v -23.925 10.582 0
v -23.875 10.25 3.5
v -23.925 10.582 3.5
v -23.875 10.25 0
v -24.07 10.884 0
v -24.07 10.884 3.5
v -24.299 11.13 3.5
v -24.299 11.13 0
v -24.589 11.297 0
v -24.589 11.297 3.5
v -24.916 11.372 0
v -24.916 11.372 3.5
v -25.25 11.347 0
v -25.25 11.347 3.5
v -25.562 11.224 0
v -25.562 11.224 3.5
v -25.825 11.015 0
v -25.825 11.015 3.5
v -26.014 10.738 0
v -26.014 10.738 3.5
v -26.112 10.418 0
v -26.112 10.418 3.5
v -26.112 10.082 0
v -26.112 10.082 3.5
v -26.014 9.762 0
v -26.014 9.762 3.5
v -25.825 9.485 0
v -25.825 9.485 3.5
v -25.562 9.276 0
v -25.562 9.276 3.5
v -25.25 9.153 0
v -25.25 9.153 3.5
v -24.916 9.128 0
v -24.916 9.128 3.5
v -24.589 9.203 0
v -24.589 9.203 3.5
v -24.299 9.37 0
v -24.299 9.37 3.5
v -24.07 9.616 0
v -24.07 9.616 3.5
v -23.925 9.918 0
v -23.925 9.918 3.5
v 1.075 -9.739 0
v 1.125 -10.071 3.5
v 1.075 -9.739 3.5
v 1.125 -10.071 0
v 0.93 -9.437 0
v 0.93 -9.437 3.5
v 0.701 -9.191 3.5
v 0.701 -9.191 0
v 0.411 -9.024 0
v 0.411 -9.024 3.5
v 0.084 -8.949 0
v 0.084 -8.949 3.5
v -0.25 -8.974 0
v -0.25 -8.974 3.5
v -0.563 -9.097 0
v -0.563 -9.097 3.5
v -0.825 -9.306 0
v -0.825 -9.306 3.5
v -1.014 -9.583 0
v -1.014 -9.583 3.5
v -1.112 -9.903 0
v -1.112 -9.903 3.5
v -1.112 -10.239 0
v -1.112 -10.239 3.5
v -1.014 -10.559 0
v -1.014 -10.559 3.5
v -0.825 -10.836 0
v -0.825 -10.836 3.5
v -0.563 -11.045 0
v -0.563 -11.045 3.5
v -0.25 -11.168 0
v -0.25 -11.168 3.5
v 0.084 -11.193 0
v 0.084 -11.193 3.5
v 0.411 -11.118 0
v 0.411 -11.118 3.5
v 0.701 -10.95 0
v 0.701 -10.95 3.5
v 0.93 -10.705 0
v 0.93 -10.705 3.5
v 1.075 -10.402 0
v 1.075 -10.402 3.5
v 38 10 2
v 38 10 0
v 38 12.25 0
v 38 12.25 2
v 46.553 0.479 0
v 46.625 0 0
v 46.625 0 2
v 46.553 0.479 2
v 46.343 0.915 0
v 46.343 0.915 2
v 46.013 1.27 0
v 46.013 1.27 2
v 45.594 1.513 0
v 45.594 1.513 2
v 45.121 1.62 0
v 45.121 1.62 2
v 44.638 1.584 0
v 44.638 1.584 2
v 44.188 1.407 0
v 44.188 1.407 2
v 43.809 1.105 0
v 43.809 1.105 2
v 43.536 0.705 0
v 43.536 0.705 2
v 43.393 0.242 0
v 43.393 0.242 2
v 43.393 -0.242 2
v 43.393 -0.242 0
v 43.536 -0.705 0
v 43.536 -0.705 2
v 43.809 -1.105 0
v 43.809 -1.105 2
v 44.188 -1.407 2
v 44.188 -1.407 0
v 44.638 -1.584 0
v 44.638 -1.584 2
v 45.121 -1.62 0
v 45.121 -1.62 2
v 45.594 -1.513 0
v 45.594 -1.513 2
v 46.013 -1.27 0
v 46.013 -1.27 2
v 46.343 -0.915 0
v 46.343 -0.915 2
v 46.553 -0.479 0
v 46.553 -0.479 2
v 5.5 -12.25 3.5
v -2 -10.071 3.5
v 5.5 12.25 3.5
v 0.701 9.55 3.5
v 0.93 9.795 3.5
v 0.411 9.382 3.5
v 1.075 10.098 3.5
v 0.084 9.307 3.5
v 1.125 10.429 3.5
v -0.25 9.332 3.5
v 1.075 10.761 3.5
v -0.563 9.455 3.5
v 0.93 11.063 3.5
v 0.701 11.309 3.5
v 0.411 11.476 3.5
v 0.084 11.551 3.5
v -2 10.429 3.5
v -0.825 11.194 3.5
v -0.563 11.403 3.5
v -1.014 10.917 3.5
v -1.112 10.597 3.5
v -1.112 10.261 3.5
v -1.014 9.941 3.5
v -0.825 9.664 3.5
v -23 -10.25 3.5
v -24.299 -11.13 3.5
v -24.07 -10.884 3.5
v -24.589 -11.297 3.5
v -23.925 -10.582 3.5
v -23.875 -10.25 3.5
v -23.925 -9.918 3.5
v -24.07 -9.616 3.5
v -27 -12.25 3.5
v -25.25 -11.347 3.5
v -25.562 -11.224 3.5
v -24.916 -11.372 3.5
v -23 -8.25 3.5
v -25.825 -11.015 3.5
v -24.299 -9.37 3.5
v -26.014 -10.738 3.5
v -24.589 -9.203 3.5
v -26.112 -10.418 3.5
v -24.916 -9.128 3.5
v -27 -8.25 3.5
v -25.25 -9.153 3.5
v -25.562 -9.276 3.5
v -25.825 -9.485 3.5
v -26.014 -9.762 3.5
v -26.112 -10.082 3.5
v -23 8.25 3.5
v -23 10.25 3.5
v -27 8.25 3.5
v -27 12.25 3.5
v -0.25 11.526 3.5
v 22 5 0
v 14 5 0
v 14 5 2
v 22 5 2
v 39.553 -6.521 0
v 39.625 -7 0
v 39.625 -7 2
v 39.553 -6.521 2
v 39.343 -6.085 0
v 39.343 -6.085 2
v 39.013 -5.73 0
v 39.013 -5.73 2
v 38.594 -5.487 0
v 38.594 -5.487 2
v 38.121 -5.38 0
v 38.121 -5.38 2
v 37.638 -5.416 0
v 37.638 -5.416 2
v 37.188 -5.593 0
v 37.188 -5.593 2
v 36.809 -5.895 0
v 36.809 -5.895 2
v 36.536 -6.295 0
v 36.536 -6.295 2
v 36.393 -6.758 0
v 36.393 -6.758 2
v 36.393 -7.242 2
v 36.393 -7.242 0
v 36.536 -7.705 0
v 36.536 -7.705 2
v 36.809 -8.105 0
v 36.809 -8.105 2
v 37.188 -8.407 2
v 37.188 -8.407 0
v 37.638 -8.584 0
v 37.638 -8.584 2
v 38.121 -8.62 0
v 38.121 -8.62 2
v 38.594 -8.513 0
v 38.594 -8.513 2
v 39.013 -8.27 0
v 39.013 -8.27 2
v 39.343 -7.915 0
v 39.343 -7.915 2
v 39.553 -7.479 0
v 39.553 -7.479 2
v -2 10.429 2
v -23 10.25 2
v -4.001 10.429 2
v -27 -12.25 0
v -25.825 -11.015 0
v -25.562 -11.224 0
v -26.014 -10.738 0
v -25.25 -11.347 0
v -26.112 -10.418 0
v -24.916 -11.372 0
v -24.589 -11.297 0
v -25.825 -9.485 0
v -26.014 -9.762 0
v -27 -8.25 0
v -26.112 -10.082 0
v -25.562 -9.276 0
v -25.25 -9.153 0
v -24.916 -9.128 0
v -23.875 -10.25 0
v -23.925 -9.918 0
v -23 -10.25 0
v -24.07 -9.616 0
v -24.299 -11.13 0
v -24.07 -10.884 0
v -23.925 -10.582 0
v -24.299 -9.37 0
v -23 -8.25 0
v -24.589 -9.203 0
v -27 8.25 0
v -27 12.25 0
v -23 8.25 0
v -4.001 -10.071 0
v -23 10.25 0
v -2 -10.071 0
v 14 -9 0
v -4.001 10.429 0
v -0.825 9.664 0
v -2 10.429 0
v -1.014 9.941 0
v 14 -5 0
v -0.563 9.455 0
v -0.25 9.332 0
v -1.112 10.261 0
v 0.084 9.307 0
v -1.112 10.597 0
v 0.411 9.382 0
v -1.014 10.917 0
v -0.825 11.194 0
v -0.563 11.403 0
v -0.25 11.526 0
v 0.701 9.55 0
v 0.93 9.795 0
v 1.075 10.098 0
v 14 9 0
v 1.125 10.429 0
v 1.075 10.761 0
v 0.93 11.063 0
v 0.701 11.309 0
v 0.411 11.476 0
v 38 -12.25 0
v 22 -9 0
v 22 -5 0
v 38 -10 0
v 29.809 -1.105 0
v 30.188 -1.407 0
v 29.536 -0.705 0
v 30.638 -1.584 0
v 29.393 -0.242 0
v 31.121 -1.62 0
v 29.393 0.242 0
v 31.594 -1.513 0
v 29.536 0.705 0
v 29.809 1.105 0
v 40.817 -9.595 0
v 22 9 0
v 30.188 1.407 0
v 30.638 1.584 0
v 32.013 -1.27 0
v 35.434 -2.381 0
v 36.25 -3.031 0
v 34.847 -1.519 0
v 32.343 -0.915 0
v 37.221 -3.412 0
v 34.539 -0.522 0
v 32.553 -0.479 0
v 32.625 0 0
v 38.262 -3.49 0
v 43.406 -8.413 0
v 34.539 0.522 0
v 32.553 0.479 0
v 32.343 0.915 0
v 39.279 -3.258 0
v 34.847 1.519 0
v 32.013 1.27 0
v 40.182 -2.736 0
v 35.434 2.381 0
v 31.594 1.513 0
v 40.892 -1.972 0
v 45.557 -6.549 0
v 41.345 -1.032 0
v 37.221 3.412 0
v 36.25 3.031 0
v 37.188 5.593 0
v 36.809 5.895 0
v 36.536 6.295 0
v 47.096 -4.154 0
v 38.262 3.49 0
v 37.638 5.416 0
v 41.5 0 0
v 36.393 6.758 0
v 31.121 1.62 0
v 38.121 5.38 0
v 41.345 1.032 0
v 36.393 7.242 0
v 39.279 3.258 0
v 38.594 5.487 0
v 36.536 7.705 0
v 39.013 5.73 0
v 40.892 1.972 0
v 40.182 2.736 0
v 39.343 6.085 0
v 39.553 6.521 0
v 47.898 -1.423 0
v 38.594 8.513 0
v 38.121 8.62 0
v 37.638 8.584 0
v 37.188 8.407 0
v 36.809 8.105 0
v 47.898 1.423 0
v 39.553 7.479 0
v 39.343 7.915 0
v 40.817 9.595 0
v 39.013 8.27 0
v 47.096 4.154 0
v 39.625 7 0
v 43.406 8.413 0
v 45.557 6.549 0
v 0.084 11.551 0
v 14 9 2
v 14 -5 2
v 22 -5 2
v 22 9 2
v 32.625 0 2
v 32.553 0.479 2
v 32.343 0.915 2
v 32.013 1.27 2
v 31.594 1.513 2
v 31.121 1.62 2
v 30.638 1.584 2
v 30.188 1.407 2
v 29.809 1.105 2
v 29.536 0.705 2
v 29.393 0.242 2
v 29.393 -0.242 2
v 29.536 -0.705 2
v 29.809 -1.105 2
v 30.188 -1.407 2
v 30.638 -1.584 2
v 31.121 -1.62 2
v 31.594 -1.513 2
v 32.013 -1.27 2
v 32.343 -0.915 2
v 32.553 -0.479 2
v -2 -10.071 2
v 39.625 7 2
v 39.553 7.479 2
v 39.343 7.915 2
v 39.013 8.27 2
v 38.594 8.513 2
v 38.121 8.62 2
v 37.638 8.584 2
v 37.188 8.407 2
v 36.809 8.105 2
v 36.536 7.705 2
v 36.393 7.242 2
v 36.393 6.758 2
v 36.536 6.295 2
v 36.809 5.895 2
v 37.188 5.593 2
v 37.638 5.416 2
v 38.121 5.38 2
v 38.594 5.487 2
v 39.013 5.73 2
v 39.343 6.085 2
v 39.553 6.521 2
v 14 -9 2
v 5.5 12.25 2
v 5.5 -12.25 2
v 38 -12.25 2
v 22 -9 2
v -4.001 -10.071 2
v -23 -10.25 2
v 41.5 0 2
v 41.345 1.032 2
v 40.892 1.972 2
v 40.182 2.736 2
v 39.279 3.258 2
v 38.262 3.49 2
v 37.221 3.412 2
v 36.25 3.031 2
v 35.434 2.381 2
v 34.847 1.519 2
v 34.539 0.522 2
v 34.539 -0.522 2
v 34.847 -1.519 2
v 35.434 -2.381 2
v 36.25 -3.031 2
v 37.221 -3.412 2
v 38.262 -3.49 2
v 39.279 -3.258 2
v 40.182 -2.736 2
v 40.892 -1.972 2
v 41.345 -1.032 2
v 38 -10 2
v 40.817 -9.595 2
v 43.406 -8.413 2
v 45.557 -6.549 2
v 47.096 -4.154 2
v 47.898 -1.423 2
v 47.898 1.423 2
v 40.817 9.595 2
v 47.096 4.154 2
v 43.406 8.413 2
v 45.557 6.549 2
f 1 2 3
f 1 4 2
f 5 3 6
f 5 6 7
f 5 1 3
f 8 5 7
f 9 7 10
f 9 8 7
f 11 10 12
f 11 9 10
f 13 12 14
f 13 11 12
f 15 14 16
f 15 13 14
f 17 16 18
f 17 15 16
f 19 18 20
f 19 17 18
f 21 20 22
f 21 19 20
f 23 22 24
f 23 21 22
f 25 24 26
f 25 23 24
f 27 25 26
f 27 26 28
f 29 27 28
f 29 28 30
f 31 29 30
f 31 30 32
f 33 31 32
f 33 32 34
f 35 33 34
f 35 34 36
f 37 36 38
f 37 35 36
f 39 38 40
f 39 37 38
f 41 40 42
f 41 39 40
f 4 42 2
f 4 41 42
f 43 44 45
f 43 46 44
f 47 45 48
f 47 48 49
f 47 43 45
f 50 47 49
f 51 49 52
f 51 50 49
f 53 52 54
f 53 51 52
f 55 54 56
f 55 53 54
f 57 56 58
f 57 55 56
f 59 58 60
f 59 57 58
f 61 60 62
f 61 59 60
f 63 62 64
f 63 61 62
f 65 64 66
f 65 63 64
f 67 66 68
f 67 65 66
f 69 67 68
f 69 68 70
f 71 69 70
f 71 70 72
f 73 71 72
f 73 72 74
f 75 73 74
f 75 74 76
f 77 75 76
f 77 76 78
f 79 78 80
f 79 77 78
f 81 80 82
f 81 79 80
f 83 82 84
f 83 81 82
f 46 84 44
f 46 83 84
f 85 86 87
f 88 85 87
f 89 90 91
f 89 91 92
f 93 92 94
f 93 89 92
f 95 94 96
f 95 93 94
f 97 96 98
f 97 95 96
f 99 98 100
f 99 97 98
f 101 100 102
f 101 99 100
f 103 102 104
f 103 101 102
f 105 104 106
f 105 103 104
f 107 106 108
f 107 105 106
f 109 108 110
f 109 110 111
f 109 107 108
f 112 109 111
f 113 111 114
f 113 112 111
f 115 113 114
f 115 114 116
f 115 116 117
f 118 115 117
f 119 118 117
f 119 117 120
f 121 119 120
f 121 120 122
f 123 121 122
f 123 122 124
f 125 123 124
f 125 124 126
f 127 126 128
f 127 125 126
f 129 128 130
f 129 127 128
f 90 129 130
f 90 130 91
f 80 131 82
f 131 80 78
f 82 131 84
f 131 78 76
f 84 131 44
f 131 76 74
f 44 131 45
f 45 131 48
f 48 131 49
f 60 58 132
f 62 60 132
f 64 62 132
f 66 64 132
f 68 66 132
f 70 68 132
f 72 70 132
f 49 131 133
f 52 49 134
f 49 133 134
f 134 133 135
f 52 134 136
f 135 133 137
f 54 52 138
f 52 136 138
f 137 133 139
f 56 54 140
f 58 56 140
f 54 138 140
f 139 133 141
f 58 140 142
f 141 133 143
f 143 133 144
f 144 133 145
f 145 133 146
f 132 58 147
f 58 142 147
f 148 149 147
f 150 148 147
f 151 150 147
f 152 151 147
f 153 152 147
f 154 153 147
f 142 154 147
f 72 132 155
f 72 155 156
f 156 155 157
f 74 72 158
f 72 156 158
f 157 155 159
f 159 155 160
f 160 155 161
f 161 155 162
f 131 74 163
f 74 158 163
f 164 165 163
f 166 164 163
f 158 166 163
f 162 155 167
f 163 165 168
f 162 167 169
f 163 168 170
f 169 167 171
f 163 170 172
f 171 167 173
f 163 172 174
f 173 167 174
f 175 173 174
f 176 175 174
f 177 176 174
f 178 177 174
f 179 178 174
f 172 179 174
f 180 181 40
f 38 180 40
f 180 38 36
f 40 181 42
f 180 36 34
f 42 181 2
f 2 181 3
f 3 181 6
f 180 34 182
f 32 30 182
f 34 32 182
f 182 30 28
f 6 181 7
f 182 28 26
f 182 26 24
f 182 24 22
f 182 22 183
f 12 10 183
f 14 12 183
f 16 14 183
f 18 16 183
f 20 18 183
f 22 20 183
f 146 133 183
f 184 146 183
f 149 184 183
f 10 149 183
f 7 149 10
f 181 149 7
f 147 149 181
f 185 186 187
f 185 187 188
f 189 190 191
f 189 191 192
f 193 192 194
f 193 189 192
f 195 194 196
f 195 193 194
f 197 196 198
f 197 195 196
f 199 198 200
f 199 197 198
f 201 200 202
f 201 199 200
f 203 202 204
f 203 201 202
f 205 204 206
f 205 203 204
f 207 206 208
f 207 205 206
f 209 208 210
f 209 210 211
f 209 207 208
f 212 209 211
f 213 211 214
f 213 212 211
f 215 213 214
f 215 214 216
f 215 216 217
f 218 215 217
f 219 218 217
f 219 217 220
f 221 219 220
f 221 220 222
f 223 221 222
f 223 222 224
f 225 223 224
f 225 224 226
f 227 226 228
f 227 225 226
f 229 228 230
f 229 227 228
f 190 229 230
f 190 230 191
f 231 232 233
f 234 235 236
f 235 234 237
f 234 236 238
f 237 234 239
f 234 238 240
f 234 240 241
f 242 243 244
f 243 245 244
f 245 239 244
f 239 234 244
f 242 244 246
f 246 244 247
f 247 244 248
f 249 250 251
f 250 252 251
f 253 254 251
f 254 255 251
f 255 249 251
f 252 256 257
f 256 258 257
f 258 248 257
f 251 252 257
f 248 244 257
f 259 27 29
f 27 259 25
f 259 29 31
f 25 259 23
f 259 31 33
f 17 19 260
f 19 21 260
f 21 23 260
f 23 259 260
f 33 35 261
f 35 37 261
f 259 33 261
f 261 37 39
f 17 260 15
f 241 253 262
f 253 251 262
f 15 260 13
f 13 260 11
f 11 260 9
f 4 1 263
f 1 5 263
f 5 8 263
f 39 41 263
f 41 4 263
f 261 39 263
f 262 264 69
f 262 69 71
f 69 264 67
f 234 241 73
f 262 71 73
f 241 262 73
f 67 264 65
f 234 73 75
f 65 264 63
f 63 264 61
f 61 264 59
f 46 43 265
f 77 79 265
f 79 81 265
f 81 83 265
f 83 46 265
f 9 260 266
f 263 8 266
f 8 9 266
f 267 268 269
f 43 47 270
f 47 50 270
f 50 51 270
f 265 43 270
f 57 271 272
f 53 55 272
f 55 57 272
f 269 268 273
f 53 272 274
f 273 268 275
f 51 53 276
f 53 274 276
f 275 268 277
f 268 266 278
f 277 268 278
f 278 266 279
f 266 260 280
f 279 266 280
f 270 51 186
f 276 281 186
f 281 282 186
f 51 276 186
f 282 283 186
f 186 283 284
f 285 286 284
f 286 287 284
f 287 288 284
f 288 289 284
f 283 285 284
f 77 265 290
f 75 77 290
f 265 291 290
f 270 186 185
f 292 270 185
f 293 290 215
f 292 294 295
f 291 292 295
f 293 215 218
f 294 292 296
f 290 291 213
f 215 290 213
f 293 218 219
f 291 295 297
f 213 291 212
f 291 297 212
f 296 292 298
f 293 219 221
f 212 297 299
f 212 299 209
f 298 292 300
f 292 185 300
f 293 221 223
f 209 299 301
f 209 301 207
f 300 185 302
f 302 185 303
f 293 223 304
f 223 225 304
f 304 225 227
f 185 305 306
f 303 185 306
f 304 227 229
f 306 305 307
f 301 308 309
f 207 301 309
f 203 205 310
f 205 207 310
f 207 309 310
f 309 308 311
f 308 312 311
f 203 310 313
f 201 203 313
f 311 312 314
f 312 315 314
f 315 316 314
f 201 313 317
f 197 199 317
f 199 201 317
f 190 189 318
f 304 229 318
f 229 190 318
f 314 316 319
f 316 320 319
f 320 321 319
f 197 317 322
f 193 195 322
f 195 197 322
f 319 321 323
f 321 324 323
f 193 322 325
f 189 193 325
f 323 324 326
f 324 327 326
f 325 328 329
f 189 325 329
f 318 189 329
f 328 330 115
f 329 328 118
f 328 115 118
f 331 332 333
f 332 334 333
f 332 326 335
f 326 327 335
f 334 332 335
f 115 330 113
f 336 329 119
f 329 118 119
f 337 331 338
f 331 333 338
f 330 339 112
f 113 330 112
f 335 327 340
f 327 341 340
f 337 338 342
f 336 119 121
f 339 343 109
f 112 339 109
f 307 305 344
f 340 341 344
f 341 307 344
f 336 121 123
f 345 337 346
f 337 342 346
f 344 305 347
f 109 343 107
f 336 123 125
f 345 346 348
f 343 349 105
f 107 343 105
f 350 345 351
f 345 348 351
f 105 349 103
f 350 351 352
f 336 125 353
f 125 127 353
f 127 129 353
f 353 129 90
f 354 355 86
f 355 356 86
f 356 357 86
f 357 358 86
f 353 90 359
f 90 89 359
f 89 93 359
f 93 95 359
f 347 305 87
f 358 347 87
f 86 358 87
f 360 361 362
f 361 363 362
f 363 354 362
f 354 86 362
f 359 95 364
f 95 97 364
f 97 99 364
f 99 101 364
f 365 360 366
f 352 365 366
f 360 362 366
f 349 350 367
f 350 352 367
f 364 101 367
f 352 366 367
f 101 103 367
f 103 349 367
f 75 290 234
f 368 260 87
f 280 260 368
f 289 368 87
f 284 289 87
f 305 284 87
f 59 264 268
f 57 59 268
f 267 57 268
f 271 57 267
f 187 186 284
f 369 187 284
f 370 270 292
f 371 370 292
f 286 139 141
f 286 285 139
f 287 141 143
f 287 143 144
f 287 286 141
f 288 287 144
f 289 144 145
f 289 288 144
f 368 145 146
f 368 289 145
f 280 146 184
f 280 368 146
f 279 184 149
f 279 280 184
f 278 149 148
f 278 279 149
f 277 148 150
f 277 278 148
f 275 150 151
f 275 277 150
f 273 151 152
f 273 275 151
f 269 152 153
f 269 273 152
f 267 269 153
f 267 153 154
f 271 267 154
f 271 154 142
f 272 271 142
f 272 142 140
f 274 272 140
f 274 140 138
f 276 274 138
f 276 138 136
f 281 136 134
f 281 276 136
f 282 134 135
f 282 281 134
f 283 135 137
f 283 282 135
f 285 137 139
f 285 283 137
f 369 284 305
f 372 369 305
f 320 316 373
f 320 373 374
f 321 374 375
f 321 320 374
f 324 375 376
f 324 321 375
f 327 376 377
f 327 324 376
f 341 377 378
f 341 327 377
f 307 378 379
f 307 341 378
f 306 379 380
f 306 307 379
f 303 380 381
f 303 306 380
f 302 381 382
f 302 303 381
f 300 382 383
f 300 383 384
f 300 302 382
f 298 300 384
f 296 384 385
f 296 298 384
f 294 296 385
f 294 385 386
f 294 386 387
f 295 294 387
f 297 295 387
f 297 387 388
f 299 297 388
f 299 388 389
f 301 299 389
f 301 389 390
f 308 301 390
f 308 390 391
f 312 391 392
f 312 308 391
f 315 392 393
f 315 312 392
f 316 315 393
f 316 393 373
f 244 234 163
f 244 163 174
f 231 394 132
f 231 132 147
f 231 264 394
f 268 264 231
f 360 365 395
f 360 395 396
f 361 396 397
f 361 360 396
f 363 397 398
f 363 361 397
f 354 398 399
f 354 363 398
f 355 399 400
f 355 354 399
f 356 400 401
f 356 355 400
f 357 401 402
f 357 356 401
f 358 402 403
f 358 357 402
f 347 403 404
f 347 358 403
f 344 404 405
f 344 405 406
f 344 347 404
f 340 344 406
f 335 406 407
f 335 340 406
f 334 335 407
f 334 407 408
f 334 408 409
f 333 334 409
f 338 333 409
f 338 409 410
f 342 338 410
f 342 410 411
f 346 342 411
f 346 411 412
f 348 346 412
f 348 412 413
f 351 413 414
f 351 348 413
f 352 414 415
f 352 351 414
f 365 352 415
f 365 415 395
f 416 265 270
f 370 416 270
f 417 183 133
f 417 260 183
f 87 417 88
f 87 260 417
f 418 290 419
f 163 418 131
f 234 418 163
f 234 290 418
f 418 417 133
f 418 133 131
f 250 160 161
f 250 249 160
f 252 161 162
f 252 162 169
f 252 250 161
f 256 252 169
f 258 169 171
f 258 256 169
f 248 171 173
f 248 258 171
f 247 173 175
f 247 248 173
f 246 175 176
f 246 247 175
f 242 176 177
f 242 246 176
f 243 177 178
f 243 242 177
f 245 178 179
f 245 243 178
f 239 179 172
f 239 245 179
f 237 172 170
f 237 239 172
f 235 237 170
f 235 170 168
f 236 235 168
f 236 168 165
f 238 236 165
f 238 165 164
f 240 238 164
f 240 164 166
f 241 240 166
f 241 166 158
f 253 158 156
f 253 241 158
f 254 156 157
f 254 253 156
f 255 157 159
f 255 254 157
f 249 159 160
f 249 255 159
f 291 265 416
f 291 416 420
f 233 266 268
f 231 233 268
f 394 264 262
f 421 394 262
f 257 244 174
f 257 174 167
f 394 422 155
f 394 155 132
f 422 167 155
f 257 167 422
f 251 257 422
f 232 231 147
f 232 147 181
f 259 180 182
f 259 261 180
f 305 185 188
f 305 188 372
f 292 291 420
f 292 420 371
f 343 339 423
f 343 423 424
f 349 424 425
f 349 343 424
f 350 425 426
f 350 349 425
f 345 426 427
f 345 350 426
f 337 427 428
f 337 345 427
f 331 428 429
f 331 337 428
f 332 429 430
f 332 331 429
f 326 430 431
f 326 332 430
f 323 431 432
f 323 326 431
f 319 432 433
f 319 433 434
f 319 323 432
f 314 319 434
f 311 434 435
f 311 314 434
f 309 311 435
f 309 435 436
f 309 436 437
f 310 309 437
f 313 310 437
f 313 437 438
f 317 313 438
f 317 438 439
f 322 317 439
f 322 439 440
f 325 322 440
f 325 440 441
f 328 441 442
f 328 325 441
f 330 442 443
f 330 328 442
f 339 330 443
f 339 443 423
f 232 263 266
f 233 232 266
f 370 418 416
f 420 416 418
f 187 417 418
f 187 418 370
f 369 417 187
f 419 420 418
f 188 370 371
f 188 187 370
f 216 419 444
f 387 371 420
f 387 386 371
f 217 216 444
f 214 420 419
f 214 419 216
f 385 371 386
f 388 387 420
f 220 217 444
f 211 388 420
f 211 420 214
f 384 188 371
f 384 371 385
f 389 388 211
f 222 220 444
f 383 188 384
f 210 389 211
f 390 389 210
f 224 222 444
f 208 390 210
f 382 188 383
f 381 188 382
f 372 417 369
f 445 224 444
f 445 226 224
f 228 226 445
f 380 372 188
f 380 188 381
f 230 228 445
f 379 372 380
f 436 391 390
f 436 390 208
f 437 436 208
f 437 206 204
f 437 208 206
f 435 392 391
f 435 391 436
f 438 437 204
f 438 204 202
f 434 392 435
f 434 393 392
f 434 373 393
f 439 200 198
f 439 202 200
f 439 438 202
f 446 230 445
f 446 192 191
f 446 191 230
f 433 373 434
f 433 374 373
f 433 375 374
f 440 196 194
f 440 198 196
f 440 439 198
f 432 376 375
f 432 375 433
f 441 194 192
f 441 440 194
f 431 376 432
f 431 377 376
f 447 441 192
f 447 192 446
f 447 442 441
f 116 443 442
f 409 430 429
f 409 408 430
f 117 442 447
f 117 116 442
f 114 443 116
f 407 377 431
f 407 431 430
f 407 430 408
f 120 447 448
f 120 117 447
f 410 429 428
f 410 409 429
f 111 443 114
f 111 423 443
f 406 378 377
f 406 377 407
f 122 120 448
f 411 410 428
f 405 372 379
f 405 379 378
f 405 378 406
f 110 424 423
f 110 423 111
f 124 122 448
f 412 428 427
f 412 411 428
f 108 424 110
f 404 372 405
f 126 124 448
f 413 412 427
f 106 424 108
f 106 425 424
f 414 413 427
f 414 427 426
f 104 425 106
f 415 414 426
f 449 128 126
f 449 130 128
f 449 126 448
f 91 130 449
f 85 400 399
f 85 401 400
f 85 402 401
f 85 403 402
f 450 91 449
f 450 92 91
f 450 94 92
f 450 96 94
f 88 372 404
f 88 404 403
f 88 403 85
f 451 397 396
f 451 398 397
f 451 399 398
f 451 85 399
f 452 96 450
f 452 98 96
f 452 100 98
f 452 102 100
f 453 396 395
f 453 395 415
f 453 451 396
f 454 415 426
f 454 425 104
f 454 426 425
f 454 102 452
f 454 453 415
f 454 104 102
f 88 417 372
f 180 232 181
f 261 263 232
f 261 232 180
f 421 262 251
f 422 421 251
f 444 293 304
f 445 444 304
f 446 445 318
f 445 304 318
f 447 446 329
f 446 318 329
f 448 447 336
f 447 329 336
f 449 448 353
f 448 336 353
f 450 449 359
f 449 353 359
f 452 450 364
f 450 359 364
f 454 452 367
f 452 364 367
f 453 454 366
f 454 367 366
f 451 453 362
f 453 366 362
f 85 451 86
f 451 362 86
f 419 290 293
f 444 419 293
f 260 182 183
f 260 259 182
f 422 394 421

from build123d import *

# Parameters (mm, degrees)
SKETCH1_R           = 1.625
SKETCH1_R_2         = 3.5
SKETCH1_R_3         = 1.125
SKETCH1_W           = 8
SKETCH1_H           = 4
BOSS_EXTRUDE1_DEPTH = 2
SKETCH8_R           = 1.125
BOSS_EXTRUDE4_DEPTH = 1.5


with BuildPart() as part:
    # Sketch1 → Boss-Extrude1 (new body)
    with BuildSketch(Plane.XY):
        with BuildLine():
            Line((-27, -8.25), (-27, -12.25))
            Line((-27, -12.25), (38, -12.25))
            Line((38, -12.25), (38, -10))
            ThreePointArc((38, -10), (48, 0), (38, 10))
            Line((38, 10), (38, 12.25))
            Line((38, 12.25), (-27, 12.25))
            Line((-27, 12.25), (-27, 8.25))
            Line((-27, 8.25), (-23, 8.25))
            Line((-23, 8.25), (-23, 10.25))
            Line((-23, 10.25), (-4.001411983, 10.429151381))
            Line((-4.001411983, 10.429151381), (-2, 10.429151381))
            Line((-2, 10.429151381), (-2, -10.070848619))
            Line((-2, -10.070848619), (-4.001411983, -10.070848619))
            Line((-4.001411983, -10.070848619), (-23, -10.25))
            Line((-23, -10.25), (-23, -8.25))
            Line((-23, -8.25), (-27, -8.25))
        make_face()
        with Locations((38, 7)):
            Circle(SKETCH1_R, mode=Mode.SUBTRACT)
        with Locations((45, 0)):
            Circle(SKETCH1_R, mode=Mode.SUBTRACT)
        with Locations((38, -7)):
            Circle(SKETCH1_R, mode=Mode.SUBTRACT)
        with Locations((31, 0)):
            Circle(SKETCH1_R, mode=Mode.SUBTRACT)
        with Locations((38, 0)):
            Circle(SKETCH1_R_2, mode=Mode.SUBTRACT)
        with Locations((-25, 10.25)):
            Circle(SKETCH1_R_3, mode=Mode.SUBTRACT)
        with Locations((-25, -10.25)):
            Circle(SKETCH1_R_3, mode=Mode.SUBTRACT)
        with Locations((0, 10.429151381)):
            Circle(SKETCH1_R_3, mode=Mode.SUBTRACT)
        with Locations((0, -10.070848619)):
            Circle(SKETCH1_R_3, mode=Mode.SUBTRACT)
        with Locations((18, 7)):
            Rectangle(SKETCH1_W, SKETCH1_H, mode=Mode.SUBTRACT)
        with Locations((18, -7)):
            Rectangle(SKETCH1_W, SKETCH1_H, mode=Mode.SUBTRACT)
    extrude(amount=BOSS_EXTRUDE1_DEPTH)

    # Sketch8 → Boss-Extrude4 (add)
    with BuildSketch(Plane.XY.offset(2)):
        Polygon((-27, 12.25), (5.5, 12.25), (5.5, -12.25), (-27, -12.25), (-27, -8.25), (-23, -8.25), (-23, -10.25), (-2, -10.070848619), (-2, 10.429151381), (-23, 10.25), (-23, 8.25), (-27, 8.25), align=None)
        with Locations((-25, 10.25)):
            Circle(SKETCH8_R, mode=Mode.SUBTRACT)
        with Locations((-25, -10.25)):
            Circle(SKETCH8_R, mode=Mode.SUBTRACT)
        with Locations((0, 10.429151381)):
            Circle(SKETCH8_R, mode=Mode.SUBTRACT)
        with Locations((0, -10.070848619)):
            Circle(SKETCH8_R, mode=Mode.SUBTRACT)
    extrude(amount=BOSS_EXTRUDE4_DEPTH)


solid = part.part
